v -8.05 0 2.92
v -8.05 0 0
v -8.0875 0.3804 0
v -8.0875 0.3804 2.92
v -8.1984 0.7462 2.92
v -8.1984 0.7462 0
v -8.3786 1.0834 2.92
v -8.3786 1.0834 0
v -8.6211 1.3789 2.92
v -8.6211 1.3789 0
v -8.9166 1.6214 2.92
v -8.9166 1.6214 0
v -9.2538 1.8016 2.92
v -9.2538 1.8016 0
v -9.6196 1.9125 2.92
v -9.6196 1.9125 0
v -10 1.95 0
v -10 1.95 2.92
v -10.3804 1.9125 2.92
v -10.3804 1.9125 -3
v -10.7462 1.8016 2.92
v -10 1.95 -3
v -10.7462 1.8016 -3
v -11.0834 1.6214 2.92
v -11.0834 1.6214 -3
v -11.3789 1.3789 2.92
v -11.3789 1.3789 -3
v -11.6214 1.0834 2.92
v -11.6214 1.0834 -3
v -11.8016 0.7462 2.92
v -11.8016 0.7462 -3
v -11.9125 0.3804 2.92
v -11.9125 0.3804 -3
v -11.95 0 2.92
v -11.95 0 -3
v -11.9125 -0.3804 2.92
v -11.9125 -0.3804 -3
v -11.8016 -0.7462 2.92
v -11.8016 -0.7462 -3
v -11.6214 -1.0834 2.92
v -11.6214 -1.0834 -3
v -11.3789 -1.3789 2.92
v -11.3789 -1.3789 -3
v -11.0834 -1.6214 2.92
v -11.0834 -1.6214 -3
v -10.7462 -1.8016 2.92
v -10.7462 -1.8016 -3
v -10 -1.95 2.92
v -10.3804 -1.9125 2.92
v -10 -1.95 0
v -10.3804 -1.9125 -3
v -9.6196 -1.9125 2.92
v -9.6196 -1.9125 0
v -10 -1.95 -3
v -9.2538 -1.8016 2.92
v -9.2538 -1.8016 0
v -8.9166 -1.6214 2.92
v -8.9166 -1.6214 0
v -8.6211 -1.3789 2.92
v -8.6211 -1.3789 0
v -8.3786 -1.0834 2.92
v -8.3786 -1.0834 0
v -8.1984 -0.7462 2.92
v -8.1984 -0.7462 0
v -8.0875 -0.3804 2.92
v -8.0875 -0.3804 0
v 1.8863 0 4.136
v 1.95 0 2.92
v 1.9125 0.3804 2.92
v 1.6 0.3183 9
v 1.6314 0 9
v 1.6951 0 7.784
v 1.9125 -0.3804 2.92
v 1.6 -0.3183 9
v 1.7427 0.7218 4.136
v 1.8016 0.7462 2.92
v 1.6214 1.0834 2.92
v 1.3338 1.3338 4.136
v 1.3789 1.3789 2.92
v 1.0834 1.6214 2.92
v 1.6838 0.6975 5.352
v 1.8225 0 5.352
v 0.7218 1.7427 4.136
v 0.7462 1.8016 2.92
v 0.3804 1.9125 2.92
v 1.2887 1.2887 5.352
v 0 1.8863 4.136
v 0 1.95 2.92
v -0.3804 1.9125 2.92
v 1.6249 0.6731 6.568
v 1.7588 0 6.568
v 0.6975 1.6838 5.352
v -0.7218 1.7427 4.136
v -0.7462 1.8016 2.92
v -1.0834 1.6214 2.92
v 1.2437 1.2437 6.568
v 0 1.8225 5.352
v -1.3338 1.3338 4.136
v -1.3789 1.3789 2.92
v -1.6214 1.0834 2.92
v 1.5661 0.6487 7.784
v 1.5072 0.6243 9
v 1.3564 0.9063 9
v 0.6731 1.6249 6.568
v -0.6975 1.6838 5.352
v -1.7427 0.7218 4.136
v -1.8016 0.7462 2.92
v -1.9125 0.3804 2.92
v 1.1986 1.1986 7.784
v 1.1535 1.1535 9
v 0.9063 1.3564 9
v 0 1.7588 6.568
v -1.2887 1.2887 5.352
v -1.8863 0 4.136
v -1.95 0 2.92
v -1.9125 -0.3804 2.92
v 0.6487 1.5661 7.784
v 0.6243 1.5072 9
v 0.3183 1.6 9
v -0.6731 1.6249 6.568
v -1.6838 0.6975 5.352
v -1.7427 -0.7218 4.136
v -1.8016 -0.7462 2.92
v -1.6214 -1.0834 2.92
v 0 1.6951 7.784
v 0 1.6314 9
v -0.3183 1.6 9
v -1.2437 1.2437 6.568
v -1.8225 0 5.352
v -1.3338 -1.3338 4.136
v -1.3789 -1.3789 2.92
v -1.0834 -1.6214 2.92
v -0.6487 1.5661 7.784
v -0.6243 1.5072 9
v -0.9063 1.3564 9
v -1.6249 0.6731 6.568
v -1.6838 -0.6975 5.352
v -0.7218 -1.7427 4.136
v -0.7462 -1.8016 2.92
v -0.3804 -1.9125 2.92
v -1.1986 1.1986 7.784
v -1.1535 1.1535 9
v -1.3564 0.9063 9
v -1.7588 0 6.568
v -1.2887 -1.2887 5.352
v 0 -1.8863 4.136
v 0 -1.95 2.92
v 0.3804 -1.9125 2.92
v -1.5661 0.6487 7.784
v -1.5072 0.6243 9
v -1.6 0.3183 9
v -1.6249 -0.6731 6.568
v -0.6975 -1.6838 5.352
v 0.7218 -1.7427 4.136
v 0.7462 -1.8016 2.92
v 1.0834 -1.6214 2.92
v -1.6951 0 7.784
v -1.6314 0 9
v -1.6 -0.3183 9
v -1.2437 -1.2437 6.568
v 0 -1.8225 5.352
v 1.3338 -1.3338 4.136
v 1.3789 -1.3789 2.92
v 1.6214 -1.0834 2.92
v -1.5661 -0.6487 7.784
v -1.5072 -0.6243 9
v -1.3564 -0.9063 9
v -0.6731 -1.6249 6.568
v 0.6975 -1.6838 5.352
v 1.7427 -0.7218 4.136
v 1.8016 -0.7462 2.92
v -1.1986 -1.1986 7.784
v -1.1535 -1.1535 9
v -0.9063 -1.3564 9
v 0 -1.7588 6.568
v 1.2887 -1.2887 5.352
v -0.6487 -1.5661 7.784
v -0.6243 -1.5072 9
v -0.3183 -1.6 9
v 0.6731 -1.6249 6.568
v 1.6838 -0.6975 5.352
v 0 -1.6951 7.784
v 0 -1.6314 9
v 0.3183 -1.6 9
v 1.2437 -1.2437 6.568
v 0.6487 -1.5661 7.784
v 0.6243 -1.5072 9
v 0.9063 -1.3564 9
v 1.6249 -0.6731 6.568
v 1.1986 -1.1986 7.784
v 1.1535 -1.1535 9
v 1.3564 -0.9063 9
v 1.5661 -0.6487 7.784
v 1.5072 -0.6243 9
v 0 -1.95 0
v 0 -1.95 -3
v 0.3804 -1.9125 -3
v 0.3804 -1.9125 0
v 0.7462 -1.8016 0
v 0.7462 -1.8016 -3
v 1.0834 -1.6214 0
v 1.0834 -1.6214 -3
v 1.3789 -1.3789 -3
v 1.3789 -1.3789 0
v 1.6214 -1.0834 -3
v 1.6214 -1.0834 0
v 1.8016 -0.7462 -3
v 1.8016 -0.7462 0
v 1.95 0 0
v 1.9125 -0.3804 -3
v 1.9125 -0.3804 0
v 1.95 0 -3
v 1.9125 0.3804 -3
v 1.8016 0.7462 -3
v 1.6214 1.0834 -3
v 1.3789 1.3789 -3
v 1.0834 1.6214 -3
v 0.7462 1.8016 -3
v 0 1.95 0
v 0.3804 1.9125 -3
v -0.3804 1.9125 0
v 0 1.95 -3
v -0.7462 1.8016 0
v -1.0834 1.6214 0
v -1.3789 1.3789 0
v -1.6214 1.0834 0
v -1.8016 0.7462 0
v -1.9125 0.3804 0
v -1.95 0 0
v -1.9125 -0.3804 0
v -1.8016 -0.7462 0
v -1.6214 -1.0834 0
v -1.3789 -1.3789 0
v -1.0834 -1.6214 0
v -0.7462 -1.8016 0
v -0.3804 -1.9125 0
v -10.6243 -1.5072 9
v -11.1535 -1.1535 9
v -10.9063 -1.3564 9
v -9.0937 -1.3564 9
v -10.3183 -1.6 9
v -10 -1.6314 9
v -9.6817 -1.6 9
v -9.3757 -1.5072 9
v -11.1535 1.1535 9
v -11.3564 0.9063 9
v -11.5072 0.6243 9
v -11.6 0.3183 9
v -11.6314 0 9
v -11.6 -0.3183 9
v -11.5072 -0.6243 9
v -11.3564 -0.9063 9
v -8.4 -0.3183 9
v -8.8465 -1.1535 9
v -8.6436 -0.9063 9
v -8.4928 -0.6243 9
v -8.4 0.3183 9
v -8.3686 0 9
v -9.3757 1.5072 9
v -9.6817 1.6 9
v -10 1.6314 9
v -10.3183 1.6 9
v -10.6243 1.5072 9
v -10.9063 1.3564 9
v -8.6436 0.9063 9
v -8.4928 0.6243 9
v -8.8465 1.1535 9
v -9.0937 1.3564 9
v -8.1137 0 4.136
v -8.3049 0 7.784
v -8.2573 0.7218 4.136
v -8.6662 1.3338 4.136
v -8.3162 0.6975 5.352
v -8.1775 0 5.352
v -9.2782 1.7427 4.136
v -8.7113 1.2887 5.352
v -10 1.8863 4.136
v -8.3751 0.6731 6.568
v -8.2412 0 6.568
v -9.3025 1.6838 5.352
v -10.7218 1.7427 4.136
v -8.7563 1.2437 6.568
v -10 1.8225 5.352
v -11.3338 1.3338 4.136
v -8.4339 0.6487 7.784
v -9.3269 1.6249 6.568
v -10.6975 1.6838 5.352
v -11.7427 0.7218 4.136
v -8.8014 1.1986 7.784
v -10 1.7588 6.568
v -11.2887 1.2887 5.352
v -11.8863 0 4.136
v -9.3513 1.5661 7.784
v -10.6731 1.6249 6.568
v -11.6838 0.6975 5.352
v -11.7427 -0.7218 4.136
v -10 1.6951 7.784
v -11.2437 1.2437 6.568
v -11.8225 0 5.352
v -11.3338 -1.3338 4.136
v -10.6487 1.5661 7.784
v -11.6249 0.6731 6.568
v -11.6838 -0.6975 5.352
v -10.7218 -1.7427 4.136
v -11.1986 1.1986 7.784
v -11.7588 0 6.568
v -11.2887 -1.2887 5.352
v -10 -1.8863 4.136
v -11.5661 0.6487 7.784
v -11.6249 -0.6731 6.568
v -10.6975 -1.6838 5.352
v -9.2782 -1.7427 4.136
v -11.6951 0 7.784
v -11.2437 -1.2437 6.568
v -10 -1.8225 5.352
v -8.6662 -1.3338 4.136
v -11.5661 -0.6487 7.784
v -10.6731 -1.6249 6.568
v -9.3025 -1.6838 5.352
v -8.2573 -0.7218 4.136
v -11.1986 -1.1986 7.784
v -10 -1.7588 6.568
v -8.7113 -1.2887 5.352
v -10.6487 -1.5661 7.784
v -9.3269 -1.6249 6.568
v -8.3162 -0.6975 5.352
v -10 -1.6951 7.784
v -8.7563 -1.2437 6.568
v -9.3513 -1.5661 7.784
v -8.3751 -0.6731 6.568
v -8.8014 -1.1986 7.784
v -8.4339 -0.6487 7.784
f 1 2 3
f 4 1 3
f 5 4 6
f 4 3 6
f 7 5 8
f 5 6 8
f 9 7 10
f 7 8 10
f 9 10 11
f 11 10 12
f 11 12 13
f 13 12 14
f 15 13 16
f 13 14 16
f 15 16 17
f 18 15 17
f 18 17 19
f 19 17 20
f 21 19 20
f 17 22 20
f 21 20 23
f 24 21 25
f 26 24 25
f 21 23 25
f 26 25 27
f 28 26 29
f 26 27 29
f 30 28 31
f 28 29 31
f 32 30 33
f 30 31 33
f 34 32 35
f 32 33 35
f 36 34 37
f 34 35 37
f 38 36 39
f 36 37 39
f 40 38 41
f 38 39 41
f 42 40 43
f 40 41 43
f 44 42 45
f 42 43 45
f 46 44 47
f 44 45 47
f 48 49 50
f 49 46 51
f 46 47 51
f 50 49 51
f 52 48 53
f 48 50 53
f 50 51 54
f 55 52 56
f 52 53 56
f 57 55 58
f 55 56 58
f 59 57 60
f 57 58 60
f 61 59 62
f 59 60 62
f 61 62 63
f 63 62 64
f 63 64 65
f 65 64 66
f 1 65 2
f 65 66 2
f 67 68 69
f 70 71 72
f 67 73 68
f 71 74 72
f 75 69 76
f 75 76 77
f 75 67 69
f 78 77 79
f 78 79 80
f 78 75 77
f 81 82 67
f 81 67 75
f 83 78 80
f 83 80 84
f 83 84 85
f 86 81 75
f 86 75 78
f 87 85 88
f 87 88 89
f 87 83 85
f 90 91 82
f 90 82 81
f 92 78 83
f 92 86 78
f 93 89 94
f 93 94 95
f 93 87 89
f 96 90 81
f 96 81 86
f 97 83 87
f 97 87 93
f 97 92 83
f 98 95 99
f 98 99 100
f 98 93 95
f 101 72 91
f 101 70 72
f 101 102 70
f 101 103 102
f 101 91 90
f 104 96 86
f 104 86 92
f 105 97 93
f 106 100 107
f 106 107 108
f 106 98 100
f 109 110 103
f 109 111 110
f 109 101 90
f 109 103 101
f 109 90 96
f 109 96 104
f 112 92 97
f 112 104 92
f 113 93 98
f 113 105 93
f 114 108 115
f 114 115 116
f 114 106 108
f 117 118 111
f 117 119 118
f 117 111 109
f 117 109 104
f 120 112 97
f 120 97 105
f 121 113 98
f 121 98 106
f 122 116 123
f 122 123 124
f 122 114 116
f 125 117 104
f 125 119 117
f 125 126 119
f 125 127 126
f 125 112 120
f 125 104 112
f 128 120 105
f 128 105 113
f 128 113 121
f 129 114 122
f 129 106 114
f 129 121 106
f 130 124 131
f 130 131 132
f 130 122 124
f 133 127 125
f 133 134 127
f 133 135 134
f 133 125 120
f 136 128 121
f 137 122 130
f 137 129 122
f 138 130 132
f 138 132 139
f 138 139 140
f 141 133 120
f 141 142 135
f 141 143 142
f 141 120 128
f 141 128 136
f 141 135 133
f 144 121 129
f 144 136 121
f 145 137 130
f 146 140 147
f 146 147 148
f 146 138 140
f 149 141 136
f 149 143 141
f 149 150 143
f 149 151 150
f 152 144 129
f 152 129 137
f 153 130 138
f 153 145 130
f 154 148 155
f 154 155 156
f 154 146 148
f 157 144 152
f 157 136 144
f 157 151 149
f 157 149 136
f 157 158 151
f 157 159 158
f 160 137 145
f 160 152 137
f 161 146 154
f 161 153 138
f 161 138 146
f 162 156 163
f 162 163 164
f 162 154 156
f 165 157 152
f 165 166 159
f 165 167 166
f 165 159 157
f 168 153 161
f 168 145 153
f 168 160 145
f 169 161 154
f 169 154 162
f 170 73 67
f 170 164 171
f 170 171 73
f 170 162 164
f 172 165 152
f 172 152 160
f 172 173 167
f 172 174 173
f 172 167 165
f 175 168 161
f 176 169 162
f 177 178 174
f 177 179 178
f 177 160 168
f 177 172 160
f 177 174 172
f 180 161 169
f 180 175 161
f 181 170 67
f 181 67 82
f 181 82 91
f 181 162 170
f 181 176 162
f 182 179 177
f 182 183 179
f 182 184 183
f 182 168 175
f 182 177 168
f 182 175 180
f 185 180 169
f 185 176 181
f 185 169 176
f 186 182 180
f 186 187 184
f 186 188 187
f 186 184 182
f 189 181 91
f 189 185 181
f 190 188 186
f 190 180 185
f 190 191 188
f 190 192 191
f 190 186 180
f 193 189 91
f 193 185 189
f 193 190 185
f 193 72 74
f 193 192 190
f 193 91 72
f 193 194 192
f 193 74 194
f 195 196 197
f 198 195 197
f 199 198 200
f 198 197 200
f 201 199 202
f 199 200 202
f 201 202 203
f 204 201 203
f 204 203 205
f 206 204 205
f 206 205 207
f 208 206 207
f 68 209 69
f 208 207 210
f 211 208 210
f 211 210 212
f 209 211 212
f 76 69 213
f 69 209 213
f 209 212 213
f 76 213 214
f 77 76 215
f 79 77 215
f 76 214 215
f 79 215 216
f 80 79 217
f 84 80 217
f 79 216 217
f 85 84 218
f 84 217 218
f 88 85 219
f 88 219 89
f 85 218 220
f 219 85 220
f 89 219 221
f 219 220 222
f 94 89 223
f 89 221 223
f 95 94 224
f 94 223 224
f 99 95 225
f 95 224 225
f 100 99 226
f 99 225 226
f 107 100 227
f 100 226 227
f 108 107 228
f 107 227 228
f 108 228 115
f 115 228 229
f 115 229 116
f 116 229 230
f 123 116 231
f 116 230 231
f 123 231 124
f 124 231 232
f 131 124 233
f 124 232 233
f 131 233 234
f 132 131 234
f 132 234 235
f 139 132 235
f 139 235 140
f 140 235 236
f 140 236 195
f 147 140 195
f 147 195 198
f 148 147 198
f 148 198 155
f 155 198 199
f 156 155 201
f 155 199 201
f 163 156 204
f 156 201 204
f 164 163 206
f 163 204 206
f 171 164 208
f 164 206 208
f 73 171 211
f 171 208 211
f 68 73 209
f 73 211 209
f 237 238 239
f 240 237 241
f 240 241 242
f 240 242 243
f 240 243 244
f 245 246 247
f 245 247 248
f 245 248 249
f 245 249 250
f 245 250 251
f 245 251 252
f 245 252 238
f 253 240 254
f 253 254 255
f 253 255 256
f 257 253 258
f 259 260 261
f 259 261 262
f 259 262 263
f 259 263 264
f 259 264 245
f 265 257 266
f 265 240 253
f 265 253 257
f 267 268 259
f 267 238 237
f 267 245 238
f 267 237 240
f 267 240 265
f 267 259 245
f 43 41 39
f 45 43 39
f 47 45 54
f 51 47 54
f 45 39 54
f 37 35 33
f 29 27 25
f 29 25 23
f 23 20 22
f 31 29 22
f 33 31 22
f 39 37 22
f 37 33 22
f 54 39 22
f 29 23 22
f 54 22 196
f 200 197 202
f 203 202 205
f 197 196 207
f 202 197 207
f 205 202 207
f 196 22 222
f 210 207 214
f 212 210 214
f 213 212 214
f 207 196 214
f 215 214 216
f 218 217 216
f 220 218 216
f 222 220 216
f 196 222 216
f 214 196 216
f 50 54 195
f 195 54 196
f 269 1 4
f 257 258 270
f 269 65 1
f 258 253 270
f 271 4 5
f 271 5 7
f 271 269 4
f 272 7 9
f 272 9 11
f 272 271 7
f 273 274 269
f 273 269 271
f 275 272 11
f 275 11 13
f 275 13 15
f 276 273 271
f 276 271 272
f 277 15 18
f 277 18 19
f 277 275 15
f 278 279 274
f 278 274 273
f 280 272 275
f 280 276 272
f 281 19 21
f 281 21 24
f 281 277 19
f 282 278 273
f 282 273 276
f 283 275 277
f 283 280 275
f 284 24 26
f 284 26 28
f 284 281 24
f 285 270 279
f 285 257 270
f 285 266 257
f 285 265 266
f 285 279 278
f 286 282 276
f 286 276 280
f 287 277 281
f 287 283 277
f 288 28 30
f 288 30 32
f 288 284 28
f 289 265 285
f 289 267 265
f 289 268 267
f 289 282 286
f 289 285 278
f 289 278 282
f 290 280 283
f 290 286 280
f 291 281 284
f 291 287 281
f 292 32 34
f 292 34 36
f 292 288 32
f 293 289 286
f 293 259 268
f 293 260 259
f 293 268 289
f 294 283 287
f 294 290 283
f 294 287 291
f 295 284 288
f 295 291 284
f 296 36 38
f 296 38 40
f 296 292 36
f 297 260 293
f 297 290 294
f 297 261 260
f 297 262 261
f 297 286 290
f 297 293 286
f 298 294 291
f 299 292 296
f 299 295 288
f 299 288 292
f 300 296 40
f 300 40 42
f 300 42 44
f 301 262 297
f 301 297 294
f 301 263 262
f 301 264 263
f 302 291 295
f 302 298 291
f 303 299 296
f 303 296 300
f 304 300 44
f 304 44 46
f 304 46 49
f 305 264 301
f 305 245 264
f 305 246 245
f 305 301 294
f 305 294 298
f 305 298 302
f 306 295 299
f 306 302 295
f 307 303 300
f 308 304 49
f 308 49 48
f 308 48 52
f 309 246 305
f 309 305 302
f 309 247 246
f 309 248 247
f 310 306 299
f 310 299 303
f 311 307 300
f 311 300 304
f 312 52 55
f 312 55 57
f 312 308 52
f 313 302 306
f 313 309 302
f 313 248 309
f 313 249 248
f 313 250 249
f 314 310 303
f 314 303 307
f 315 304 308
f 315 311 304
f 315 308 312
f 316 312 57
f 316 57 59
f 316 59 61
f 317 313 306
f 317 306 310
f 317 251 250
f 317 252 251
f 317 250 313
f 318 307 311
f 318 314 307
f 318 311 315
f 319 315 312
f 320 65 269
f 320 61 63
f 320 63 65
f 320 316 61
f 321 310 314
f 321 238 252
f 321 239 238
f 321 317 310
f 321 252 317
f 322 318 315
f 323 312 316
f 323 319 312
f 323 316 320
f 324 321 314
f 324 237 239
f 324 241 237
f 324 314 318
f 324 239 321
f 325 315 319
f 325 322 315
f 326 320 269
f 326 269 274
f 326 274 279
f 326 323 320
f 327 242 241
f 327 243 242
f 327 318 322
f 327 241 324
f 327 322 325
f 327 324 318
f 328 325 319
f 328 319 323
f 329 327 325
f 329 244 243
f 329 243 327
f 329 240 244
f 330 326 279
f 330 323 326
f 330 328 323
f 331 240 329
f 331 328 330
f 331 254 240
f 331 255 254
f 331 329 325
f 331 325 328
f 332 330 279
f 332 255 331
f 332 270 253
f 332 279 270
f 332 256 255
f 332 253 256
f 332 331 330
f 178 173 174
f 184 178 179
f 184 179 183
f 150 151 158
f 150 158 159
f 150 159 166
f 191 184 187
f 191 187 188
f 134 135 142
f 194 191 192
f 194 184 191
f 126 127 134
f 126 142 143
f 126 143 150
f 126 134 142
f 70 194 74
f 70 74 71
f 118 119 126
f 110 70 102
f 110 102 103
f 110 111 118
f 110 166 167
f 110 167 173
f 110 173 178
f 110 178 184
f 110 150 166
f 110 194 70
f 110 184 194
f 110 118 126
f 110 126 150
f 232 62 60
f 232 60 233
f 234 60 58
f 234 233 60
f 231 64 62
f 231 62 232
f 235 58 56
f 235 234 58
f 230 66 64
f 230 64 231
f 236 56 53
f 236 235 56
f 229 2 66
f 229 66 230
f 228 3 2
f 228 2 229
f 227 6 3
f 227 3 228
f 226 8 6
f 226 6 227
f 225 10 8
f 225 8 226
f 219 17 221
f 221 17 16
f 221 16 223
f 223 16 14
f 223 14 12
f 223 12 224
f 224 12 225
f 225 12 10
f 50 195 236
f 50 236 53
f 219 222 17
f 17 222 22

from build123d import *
from OCP.BRepFilletAPI import BRepFilletAPI_MakeChamfer

# Parameters (mm, degrees)
SKETCH1_R             = 1.95
BOSS_EXTRUDE1_DEPTH   = 9
BOSS_EXTRUDE1_2_DEPTH = 9
BOSS_EXTRUDE2_START   = -3
BOSS_EXTRUDE2_DEPTH   = 3
CHAMFER1_SIZE         = 6.08
CHAMFER1_SIZE2        = 0.318639298


with BuildPart() as part:
    # Sketch1 → Boss-Extrude1 (new body)
    with BuildSketch(Plane.XY):
        with Locations((-10, 0)):
            Circle(SKETCH1_R)
    extrude(amount=BOSS_EXTRUDE1_DEPTH)



with BuildPart() as body_2:
    # Sketch1 → Boss-Extrude1 2 (new body)
    with BuildSketch(Plane.XY):
        Circle(SKETCH1_R)
    extrude(amount=BOSS_EXTRUDE1_2_DEPTH)


with BuildPart() as part_1:
    add(part.part)

    add(body_2.part)  # Boss-Extrude2 merges body 2
    # Sketch1<3> → Boss-Extrude2 (add)
    with BuildSketch(Plane.XY.offset(BOSS_EXTRUDE2_START)):
        with BuildLine():
            Line((0, 1.95), (-10, 1.95))
            ThreePointArc((-10, 1.95), (-11.95, 0), (-10, -1.95))
            Line((-10, -1.95), (0, -1.95))
            ThreePointArc((0, -1.95), (1.95, 0), (0, 1.95))
        make_face()
    extrude(amount=BOSS_EXTRUDE2_DEPTH)

    # Chamfer1: one chamfer whose edges measure the first distance from different faces: ONE call of the kernel's chamfer builder (chamfer() names one face for all edges)
    chamfer1_edges_1 = [part_1.edges().sort_by_distance(p)[0] for p in [
        (-1.95, 0, 9),
    ]]
    chamfer1_side_1 = [part_1.faces().sort_by_distance(p)[0] for p in [
        (-1.378858223, 1.378858223, 3),
    ]]
    chamfer1_edges_2 = [part_1.edges().sort_by_distance(p)[0] for p in [
        (-11.95, 0, 9),
    ]]
    chamfer1_side_2 = [part_1.faces().sort_by_distance(p)[0] for p in [
        (-11.95, 0, 3),
    ]]
    chamfer1 = BRepFilletAPI_MakeChamfer(part_1.part.solid().wrapped)
    for e in chamfer1_edges_1:
        chamfer1.Add(CHAMFER1_SIZE, CHAMFER1_SIZE2, e.wrapped, chamfer1_side_1[0].wrapped)  # the first distance lies on this face
    for e in chamfer1_edges_2:
        chamfer1.Add(CHAMFER1_SIZE, CHAMFER1_SIZE2, e.wrapped, chamfer1_side_2[0].wrapped)  # the first distance lies on this face
    add(Compound.cast(chamfer1.Shape()), mode=Mode.REPLACE)


solid = part_1.part
